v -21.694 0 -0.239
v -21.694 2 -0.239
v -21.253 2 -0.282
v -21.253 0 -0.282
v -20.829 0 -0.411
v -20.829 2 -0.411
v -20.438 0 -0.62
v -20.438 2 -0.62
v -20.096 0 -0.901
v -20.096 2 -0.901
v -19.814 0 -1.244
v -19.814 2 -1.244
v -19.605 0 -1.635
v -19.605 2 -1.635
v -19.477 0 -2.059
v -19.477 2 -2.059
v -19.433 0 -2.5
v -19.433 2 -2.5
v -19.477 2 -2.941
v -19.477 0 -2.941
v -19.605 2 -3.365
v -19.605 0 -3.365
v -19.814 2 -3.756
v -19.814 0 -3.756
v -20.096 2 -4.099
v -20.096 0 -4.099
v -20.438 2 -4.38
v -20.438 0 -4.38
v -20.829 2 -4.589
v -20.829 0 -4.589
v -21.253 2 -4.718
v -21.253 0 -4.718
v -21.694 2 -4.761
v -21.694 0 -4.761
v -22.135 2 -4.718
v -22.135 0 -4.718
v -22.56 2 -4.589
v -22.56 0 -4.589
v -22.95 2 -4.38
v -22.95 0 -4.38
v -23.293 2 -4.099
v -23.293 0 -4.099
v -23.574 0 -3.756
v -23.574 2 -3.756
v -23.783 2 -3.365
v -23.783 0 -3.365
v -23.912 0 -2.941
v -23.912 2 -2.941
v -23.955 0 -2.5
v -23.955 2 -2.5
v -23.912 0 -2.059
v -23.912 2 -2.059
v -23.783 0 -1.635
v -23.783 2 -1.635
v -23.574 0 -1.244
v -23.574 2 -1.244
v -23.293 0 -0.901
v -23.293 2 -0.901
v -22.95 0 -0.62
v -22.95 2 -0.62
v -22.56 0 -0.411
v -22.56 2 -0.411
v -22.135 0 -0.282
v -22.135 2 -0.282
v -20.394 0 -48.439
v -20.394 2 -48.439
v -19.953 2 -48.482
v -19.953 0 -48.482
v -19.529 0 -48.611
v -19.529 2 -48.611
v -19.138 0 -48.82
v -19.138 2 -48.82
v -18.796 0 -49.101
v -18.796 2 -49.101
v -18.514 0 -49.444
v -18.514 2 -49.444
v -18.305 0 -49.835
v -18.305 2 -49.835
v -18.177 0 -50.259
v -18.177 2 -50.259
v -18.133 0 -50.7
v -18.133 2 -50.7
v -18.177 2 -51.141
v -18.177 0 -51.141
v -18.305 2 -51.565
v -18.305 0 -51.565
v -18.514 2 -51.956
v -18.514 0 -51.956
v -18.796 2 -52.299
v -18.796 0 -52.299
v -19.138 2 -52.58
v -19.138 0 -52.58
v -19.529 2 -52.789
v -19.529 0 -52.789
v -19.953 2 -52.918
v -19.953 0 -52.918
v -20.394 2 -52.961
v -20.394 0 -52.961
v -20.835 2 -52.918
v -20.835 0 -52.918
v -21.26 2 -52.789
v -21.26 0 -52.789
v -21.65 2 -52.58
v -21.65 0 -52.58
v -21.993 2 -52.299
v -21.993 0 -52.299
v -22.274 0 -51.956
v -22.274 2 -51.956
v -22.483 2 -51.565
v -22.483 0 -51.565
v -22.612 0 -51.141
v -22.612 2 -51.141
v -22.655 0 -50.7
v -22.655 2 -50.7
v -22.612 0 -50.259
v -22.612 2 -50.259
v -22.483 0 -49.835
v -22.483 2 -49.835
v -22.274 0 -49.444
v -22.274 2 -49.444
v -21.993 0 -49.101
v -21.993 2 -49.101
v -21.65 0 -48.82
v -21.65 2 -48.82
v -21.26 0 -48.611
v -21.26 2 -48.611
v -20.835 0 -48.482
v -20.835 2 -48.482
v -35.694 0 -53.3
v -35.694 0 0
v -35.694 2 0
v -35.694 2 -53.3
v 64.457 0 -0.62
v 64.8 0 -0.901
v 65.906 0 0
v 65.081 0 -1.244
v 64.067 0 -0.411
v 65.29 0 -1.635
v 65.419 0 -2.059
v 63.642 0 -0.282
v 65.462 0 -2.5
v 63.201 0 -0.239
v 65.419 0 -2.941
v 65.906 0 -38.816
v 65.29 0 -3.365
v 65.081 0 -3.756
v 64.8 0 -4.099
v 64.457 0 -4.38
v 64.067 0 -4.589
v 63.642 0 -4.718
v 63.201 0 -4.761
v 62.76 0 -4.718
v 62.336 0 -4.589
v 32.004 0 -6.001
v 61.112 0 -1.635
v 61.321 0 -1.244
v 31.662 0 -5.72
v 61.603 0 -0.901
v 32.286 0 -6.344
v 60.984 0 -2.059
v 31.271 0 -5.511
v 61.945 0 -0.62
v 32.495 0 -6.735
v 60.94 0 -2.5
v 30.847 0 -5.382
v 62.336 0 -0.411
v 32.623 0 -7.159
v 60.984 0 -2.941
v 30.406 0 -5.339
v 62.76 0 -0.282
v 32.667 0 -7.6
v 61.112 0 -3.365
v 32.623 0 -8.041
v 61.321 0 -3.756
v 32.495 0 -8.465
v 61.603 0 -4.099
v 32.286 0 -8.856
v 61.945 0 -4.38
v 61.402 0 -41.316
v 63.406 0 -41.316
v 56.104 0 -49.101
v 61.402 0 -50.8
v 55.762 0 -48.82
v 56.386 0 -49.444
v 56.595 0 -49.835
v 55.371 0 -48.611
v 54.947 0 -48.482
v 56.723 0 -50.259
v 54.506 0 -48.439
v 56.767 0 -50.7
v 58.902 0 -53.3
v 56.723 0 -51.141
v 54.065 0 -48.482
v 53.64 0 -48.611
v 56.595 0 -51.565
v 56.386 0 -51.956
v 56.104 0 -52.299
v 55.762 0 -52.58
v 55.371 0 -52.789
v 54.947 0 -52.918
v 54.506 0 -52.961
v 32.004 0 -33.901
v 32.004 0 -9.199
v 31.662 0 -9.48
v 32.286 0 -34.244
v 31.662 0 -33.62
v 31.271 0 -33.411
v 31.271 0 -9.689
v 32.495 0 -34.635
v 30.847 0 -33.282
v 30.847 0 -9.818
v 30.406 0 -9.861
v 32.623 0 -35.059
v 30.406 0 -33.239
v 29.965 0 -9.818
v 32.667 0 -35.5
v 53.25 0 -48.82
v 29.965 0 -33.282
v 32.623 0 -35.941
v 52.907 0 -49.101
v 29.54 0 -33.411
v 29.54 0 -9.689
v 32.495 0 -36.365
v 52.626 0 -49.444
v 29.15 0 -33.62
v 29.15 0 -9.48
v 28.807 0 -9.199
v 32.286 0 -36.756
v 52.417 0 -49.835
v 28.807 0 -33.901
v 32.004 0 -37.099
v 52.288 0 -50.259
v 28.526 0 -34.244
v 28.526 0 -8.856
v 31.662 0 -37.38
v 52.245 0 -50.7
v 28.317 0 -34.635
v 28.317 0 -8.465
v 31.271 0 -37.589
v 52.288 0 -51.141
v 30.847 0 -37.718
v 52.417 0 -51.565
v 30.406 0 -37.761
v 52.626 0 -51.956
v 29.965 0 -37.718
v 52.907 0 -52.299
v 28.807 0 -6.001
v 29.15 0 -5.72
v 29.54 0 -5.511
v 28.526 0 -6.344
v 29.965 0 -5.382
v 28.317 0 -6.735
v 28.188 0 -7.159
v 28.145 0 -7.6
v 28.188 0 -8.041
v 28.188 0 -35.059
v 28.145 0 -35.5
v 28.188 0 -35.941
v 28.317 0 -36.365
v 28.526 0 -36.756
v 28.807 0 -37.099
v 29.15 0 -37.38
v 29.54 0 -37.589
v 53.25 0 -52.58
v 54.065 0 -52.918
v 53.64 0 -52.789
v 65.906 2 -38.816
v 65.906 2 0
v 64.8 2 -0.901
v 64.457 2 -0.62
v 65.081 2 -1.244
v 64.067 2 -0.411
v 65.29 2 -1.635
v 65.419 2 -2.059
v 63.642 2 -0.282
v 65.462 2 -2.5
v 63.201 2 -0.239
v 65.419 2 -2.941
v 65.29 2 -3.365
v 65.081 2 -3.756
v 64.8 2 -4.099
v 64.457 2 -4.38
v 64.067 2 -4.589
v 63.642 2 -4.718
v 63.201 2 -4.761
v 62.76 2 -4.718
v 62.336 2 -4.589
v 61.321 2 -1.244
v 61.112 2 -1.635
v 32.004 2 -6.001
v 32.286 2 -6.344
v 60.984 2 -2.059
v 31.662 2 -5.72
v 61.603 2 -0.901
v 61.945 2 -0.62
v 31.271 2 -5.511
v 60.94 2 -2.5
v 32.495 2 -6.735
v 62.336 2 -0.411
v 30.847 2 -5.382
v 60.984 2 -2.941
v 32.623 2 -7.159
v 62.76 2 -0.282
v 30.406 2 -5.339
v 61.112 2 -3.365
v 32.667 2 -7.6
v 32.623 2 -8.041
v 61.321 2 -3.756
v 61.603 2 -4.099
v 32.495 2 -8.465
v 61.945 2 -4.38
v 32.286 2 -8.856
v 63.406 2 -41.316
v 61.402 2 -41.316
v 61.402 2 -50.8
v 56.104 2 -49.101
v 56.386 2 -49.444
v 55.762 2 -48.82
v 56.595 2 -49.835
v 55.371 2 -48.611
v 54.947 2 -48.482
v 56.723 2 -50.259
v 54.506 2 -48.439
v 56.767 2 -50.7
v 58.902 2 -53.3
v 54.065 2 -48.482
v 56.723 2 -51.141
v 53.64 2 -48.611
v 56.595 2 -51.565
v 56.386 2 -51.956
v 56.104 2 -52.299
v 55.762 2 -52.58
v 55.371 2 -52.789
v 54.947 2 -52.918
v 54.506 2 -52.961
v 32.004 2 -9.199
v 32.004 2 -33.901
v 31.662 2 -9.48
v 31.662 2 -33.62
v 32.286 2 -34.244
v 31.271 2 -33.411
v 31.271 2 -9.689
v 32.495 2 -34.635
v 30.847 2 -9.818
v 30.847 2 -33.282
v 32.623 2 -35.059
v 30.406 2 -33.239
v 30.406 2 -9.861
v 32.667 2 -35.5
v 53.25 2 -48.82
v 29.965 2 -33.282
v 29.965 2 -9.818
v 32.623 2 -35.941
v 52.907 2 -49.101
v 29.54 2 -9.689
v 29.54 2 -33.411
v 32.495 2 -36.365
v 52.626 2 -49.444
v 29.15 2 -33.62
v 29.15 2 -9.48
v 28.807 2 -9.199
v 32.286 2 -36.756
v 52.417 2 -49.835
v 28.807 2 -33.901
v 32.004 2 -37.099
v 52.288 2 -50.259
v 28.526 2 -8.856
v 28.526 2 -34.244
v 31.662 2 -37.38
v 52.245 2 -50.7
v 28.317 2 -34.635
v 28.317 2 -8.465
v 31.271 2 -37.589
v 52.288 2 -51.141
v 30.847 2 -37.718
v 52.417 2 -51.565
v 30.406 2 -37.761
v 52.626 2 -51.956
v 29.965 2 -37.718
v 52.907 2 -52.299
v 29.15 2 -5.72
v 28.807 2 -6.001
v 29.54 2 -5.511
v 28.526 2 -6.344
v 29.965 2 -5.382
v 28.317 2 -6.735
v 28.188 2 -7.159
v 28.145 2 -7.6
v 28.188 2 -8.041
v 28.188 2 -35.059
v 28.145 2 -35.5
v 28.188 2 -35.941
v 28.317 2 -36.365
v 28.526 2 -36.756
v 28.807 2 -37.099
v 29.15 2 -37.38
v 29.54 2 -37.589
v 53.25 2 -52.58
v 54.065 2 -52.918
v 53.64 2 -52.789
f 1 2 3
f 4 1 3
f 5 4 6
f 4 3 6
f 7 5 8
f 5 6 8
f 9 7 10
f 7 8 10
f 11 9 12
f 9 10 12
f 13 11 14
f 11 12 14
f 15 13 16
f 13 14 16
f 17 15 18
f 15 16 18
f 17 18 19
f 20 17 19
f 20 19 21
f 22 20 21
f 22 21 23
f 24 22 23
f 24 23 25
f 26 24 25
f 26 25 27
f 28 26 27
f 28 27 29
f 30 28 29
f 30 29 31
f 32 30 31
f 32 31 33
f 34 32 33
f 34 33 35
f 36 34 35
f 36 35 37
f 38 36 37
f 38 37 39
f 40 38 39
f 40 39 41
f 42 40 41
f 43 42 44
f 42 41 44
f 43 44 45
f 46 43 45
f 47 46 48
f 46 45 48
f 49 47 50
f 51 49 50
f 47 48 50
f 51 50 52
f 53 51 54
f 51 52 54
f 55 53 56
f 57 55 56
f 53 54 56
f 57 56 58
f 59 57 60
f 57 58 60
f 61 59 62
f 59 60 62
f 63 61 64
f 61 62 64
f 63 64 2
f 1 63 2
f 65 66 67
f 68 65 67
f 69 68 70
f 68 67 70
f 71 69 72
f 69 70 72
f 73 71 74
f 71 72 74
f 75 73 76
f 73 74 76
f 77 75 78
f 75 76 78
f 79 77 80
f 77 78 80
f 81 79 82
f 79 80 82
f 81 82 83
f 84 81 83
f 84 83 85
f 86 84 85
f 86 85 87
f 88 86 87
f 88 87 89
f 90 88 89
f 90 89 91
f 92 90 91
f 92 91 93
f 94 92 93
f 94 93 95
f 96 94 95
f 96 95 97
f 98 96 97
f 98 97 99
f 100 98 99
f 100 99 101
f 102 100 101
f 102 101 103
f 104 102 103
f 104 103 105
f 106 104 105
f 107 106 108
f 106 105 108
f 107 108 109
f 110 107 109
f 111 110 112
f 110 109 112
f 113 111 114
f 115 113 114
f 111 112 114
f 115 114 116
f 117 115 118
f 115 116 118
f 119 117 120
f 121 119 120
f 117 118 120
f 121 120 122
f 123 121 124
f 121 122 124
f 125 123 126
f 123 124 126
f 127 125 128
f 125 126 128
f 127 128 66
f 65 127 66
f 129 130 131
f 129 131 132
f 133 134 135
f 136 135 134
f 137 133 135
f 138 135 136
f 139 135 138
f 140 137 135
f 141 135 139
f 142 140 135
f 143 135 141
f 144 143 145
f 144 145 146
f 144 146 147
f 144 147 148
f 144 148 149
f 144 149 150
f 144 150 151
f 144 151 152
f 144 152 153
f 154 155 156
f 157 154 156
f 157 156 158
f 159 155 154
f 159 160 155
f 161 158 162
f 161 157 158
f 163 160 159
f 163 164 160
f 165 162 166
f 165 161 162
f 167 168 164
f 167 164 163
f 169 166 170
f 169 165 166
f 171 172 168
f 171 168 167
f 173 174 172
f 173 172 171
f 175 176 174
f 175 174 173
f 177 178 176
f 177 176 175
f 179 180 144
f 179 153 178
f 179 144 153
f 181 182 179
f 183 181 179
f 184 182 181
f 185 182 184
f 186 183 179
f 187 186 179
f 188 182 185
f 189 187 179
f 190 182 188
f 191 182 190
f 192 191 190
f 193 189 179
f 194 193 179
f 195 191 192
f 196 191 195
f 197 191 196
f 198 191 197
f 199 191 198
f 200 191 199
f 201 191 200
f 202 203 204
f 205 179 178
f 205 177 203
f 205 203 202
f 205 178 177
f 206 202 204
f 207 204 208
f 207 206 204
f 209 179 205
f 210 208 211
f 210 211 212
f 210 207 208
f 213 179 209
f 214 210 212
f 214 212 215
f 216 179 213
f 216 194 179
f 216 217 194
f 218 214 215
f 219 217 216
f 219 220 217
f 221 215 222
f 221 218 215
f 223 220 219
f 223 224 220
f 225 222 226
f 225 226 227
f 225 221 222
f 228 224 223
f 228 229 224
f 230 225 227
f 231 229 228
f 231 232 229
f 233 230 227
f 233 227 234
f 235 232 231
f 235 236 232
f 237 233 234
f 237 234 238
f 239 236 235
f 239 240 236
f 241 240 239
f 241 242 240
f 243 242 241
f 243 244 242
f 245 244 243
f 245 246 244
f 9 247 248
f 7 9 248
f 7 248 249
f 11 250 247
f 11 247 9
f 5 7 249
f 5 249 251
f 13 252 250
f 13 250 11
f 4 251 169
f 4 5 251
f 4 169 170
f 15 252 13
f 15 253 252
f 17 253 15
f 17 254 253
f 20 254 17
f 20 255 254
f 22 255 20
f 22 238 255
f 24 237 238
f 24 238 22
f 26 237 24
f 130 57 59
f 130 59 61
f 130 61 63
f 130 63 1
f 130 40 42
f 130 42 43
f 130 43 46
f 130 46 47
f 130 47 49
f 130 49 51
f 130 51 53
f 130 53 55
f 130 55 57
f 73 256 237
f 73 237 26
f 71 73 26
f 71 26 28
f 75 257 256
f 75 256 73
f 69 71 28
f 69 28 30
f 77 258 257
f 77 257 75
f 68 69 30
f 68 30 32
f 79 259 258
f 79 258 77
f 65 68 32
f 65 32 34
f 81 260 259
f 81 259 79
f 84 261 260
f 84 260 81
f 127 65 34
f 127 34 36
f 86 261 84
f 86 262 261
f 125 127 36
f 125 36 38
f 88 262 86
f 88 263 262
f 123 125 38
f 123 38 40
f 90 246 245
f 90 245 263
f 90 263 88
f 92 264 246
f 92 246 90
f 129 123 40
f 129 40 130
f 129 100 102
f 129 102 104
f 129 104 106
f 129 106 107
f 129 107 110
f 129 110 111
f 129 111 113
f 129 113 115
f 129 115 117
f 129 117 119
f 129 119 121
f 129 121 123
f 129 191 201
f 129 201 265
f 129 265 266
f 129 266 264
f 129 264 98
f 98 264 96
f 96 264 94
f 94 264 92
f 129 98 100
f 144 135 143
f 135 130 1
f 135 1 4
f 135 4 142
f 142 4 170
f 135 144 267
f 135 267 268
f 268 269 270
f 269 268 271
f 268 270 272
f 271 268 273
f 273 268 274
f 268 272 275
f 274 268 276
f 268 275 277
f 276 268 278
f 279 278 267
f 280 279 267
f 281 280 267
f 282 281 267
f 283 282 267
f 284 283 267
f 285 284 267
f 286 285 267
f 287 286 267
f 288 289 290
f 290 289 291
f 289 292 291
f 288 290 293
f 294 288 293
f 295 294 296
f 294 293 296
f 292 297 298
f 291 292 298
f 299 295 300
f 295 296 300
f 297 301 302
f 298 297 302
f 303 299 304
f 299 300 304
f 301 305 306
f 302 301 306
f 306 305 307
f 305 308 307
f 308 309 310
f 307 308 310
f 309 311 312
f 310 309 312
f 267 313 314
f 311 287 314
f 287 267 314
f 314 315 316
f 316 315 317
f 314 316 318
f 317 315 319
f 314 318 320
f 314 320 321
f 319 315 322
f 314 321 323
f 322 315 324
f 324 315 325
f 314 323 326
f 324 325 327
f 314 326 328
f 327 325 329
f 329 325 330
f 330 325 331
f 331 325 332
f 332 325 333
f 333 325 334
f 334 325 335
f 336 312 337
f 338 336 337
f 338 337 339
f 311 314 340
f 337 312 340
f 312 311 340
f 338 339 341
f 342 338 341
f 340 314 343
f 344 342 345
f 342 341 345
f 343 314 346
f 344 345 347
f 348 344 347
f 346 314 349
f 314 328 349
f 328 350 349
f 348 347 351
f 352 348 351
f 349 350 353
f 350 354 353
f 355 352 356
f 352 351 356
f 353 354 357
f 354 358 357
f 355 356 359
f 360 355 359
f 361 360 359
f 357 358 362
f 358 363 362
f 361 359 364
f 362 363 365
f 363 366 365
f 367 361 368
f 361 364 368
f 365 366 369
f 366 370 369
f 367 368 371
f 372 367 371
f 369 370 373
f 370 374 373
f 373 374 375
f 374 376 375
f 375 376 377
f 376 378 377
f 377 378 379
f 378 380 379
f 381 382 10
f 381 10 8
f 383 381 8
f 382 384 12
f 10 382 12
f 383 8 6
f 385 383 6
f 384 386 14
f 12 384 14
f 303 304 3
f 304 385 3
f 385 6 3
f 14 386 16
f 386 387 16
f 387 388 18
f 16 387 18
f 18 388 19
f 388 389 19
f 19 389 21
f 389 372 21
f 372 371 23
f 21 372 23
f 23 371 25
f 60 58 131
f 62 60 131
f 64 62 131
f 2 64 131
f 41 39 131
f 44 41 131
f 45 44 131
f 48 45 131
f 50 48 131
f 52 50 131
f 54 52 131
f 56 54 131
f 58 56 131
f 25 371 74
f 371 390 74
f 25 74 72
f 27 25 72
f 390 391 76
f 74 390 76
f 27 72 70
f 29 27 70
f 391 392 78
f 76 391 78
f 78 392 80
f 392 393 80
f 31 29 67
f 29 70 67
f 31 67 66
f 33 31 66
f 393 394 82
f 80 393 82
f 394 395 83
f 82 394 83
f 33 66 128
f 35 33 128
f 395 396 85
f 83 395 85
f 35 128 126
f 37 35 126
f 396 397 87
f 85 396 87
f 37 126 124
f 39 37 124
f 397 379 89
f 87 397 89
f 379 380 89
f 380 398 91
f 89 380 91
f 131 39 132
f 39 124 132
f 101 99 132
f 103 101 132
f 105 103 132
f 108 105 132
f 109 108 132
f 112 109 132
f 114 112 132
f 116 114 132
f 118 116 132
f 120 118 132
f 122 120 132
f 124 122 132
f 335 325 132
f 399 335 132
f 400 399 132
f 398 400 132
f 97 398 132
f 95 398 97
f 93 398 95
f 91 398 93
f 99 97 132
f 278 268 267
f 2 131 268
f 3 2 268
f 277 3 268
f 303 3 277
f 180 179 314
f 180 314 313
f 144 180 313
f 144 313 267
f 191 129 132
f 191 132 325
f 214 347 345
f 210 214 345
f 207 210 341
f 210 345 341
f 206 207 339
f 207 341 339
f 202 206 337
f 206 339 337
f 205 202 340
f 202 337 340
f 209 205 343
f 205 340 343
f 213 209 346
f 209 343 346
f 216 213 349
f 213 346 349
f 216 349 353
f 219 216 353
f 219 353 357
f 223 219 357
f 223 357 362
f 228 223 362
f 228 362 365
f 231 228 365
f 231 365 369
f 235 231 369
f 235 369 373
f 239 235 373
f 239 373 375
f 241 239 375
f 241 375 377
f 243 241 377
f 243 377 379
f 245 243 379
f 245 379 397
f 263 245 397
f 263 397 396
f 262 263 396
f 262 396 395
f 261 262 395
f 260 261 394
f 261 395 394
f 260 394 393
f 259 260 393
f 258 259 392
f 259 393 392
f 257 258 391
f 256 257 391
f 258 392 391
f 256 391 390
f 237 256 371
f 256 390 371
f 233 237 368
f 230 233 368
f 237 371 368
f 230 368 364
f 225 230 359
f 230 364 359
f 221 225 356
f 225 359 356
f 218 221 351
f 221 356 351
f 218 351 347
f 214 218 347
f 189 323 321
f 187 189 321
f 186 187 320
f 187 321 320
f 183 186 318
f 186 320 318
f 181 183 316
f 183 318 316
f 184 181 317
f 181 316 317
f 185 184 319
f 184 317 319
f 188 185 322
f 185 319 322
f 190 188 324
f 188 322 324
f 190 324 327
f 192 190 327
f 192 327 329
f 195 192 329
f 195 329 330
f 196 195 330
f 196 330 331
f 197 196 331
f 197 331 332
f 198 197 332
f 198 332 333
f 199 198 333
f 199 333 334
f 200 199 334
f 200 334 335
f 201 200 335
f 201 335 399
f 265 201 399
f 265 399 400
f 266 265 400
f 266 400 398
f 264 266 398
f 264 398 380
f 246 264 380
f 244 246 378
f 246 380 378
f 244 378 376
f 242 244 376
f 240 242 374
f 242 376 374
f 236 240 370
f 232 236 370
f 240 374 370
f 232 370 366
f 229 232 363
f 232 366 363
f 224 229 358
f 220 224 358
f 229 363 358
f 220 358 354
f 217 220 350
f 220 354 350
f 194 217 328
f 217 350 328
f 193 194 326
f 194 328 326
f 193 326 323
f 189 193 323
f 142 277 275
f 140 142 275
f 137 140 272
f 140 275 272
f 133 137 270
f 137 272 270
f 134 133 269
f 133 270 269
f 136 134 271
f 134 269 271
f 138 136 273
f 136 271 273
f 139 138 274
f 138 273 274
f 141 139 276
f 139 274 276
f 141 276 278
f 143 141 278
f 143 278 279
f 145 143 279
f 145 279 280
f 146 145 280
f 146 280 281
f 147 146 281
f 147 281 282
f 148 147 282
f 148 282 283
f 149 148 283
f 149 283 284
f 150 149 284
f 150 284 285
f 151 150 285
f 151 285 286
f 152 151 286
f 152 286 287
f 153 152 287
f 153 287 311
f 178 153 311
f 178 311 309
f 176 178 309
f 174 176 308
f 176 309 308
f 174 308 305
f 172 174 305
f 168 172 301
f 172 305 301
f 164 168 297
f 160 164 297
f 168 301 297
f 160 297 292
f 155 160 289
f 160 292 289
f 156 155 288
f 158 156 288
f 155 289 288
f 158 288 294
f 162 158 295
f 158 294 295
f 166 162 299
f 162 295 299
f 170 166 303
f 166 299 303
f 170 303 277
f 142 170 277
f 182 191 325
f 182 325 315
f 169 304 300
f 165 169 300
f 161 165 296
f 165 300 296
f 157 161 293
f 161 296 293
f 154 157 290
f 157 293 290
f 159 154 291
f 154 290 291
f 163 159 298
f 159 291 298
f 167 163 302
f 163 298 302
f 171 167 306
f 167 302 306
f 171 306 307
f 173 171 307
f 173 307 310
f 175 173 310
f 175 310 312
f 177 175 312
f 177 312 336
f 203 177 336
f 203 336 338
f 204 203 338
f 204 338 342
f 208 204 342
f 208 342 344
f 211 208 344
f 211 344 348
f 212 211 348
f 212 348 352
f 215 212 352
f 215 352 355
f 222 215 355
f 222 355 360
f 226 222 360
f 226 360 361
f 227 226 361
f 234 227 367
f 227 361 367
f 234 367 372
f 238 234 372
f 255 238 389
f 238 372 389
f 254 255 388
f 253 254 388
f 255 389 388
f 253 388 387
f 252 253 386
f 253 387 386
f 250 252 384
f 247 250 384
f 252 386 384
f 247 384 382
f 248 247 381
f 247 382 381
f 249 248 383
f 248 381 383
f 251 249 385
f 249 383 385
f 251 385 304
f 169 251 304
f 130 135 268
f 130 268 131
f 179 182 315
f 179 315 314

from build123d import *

# Parameters (mm, degrees)
BOSS_EXTRUDE1_DEPTH = 2
SKETCH2_R           = 2.261
CUT_EXTRUDE1_DEPTH  = 4
SKETCH2_3_R         = 2.261
CUT_EXTRUDE2_DEPTH  = 4


with BuildPart() as part:
    # Sketch1 → Boss-Extrude1 (new body)
    with BuildSketch(Plane(origin=(0, 0, 0), x_dir=(1, 0, 0), z_dir=(0, 1, 0))):
        Polygon((-35.69434129, 0), (-35.69434129, 53.3), (58.90182323, 53.3), (61.40182323, 50.8), (61.40182323, 41.31634957), (63.40565871, 41.31634957), (65.90565871, 38.81634957), (65.90565871, 0), align=None)
    extrude(amount=BOSS_EXTRUDE1_DEPTH)

    # Sketch2 → Cut-Extrude1 (cut)
    with BuildSketch(Plane(origin=(0, 2, 0), x_dir=(1, 0, 0), z_dir=(0, 1, 0))):
        with Locations((-20.39434129, 50.7)):
            Circle(SKETCH2_R)
    extrude(amount=-CUT_EXTRUDE1_DEPTH, mode=Mode.SUBTRACT)

    # Sketch2<3> → Cut-Extrude2 (cut)
    with BuildSketch(Plane(origin=(0, 2, 0), x_dir=(1, 0, 0), z_dir=(0, 1, 0))):
        with Locations((-21.69434129, 2.5)):
            Circle(SKETCH2_3_R)
        with Locations((63.201299911, 2.5)):
            Circle(SKETCH2_3_R)
        with Locations((30.40565871, 7.6)):
            Circle(SKETCH2_3_R)
        with Locations((30.40565871, 35.5)):
            Circle(SKETCH2_3_R)
        with Locations((54.50565871, 50.7)):
            Circle(SKETCH2_3_R)
    extrude(amount=-CUT_EXTRUDE2_DEPTH, mode=Mode.SUBTRACT)


solid = part.part
